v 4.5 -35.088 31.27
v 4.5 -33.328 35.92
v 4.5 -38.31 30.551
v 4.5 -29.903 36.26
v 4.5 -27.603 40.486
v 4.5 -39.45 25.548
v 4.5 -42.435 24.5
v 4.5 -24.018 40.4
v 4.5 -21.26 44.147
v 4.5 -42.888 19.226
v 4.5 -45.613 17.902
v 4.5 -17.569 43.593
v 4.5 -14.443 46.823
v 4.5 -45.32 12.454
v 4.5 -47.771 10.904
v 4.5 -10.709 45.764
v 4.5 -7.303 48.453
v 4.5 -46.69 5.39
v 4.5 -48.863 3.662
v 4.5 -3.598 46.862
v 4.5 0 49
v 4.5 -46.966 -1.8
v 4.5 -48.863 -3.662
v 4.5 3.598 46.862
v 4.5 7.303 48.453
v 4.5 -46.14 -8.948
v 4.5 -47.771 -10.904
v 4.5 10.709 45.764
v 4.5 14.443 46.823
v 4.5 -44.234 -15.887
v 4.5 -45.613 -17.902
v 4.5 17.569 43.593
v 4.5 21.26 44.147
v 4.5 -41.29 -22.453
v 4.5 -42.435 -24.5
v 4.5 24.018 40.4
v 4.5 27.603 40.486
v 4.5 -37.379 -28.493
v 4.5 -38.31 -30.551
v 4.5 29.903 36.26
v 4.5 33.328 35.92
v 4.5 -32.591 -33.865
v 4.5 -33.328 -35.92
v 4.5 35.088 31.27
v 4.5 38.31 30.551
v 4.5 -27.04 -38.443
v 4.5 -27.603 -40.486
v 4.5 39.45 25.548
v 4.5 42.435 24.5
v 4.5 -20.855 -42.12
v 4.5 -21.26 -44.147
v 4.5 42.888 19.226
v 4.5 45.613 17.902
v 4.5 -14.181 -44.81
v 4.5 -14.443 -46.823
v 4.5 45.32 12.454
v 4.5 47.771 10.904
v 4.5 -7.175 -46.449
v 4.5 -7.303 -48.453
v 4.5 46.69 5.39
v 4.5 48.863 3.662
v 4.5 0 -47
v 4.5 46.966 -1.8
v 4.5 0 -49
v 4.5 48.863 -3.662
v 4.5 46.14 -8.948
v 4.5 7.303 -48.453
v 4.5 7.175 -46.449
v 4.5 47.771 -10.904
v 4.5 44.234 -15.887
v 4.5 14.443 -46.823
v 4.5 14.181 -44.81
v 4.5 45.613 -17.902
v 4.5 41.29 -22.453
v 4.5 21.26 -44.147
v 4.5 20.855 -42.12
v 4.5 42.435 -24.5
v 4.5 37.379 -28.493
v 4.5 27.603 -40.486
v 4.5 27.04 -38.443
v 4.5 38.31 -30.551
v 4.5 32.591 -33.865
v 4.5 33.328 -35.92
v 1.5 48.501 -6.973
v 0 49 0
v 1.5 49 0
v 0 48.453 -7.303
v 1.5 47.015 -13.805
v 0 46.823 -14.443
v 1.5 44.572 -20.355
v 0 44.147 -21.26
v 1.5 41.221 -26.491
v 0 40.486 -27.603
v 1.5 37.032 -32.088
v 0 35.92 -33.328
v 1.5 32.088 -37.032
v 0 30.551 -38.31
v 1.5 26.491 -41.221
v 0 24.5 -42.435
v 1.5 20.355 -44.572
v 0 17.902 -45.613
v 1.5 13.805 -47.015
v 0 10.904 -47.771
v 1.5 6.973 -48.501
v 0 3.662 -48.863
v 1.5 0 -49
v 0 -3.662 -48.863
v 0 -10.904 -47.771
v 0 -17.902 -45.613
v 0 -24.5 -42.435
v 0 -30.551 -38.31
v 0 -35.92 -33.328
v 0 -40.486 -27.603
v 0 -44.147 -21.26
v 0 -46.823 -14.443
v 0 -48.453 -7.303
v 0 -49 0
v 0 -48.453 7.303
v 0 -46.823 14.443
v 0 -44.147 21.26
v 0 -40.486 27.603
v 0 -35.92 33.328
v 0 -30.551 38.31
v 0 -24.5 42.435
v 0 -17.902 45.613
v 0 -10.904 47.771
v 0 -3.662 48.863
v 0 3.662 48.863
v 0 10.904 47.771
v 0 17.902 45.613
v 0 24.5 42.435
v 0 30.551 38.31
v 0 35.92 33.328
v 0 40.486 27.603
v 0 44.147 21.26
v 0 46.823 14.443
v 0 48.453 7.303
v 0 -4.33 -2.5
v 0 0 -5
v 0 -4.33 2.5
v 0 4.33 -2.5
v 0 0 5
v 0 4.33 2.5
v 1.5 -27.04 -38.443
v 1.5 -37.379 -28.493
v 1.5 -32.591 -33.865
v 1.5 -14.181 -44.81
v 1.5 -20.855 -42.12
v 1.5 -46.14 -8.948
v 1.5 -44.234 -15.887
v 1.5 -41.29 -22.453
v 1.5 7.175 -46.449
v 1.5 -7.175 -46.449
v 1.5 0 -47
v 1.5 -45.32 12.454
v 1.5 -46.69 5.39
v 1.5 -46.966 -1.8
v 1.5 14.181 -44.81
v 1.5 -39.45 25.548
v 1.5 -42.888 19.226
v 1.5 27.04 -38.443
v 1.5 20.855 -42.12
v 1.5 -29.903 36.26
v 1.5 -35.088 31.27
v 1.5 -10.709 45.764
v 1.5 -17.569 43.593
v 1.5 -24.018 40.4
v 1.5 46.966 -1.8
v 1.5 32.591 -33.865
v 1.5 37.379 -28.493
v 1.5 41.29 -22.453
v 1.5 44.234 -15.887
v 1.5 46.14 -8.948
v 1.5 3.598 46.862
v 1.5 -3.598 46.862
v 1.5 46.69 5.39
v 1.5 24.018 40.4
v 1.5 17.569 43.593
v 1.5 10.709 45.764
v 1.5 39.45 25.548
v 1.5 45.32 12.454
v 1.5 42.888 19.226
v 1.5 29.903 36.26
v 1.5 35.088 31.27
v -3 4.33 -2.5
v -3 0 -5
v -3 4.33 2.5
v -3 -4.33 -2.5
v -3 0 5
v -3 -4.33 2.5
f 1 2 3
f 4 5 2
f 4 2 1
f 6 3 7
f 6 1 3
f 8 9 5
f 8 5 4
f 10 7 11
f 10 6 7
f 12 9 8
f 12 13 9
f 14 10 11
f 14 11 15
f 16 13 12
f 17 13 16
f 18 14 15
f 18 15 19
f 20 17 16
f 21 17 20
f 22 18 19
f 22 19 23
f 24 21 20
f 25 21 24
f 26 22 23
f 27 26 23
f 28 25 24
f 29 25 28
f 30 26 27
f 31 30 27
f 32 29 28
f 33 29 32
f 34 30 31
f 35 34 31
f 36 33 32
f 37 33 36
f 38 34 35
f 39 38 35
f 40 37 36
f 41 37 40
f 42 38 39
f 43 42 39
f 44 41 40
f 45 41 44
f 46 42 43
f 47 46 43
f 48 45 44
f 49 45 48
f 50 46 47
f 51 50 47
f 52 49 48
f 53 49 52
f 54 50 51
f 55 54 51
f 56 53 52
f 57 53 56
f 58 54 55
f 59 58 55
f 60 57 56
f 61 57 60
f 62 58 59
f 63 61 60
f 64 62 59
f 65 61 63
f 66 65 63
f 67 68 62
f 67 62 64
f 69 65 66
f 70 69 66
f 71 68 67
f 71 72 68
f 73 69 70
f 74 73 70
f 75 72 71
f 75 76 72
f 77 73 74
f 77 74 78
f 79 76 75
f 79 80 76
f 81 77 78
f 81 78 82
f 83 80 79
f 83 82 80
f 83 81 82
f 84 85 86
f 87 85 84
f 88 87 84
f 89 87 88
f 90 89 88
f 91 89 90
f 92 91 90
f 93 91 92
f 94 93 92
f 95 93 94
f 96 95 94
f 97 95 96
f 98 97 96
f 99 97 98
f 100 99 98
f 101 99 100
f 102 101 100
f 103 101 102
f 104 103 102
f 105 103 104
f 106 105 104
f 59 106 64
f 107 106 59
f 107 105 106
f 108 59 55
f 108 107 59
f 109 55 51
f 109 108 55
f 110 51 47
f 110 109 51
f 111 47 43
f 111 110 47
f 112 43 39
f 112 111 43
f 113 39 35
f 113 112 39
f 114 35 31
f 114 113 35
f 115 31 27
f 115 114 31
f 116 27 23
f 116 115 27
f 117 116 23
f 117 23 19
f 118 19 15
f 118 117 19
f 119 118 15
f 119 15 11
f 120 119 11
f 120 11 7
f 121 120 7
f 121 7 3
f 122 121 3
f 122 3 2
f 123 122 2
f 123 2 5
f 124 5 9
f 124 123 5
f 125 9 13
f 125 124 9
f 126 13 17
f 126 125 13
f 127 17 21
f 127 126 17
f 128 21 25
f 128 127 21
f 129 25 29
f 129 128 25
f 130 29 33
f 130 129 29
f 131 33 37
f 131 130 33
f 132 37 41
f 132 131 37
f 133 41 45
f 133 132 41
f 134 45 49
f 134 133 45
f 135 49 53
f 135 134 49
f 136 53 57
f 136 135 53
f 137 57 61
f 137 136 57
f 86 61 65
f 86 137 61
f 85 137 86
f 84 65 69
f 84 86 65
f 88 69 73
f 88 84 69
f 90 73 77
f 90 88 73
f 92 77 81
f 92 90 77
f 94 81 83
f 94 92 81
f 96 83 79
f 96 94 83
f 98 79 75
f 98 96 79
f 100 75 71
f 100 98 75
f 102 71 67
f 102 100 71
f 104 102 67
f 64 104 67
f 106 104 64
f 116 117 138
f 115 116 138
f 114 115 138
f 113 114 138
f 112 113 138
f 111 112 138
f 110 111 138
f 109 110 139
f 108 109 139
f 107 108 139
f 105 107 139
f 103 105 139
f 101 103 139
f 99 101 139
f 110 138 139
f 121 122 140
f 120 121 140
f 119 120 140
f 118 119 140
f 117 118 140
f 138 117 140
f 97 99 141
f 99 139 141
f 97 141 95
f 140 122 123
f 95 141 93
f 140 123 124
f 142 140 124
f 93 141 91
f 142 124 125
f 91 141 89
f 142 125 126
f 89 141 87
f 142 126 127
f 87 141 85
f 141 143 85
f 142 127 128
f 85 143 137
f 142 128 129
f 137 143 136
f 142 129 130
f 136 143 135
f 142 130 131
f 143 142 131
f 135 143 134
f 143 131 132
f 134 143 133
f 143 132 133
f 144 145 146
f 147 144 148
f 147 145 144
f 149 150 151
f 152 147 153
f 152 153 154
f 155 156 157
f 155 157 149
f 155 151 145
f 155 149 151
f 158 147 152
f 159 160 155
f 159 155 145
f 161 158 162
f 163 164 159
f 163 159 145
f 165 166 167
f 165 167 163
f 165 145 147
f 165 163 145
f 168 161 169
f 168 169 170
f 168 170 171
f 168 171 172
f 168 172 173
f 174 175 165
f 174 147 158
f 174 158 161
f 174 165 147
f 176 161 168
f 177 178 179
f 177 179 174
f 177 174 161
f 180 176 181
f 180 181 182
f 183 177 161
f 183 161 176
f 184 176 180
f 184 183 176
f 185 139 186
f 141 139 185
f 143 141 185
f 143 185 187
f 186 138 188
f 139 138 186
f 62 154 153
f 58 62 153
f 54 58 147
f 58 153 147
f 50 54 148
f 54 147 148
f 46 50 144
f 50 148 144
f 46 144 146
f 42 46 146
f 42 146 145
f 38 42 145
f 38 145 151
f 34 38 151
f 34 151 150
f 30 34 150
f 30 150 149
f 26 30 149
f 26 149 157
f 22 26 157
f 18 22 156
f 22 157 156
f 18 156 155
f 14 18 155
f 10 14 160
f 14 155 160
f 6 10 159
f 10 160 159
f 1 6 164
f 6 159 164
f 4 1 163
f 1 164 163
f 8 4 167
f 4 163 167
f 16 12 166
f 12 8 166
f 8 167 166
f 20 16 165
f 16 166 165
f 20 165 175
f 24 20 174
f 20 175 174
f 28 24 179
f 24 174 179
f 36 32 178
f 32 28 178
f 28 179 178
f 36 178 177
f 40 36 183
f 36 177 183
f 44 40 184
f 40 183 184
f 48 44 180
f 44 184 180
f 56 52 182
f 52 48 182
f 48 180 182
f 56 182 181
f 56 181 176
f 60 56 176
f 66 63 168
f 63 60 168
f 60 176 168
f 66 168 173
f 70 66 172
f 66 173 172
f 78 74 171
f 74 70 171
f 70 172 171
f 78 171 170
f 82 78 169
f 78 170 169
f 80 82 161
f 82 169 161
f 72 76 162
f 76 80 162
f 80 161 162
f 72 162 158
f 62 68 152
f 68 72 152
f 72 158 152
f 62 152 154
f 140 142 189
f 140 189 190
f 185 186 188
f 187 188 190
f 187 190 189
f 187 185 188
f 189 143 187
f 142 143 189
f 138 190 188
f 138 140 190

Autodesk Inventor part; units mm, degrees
ref_plane "YZ Plane" through (0, 0, 0) normal (1, 0, 0) x (0, 1, 0)
ref_plane "XZ Plane" through (0, 0, 0) normal (0, 1, 0) x (-1, 0, 0)
ref_plane "XY Plane" through (0, 0, 0) normal (0, 0, 1) x (1, 0, 0)
sketch "Esboço1" plane through (0, 0, 0) normal (1, 0, 0) x (0, 1, 0)
  circle A0 centre (0, 0) radius 49
  dimension "d0" = 98
extrude "Extrusão1" add sketch "Esboço1" along normal blind 1.5
sketch "Esboço2" plane through (1.5, 0, 0) normal (1, 0, 0) x (0, 0, -1)
  circle A0 centre (0, 0) radius 49
  circle A1 centre (0, 0) radius 47
  dimension "d3" = 2
extrude "Extrusão2" add sketch "Esboço2" along normal blind 3
sketch "Esboço3" plane through (0, 0, 0) normal (-1, 0, 0) x (0, 0, 1)
  line L0 (5, 0) -> (2.5, -4.3301)
  line L1 (2.5, -4.3301) -> (-2.5, -4.3301)
  line L2 (-2.5, -4.3301) -> (-5, 0)
  line L3 (-5, 0) -> (-2.5, 4.3301)
  line L4 (-2.5, 4.3301) -> (2.5, 4.3301)
  line L5 (2.5, 4.3301) -> (5, 0)
  point P0 (0, 0)
  point P1 (0, 0)
  dimension "d6" = 10
extrude "Extrusão3" add sketch "Esboço3" along normal blind 3
properties part number "Base"
